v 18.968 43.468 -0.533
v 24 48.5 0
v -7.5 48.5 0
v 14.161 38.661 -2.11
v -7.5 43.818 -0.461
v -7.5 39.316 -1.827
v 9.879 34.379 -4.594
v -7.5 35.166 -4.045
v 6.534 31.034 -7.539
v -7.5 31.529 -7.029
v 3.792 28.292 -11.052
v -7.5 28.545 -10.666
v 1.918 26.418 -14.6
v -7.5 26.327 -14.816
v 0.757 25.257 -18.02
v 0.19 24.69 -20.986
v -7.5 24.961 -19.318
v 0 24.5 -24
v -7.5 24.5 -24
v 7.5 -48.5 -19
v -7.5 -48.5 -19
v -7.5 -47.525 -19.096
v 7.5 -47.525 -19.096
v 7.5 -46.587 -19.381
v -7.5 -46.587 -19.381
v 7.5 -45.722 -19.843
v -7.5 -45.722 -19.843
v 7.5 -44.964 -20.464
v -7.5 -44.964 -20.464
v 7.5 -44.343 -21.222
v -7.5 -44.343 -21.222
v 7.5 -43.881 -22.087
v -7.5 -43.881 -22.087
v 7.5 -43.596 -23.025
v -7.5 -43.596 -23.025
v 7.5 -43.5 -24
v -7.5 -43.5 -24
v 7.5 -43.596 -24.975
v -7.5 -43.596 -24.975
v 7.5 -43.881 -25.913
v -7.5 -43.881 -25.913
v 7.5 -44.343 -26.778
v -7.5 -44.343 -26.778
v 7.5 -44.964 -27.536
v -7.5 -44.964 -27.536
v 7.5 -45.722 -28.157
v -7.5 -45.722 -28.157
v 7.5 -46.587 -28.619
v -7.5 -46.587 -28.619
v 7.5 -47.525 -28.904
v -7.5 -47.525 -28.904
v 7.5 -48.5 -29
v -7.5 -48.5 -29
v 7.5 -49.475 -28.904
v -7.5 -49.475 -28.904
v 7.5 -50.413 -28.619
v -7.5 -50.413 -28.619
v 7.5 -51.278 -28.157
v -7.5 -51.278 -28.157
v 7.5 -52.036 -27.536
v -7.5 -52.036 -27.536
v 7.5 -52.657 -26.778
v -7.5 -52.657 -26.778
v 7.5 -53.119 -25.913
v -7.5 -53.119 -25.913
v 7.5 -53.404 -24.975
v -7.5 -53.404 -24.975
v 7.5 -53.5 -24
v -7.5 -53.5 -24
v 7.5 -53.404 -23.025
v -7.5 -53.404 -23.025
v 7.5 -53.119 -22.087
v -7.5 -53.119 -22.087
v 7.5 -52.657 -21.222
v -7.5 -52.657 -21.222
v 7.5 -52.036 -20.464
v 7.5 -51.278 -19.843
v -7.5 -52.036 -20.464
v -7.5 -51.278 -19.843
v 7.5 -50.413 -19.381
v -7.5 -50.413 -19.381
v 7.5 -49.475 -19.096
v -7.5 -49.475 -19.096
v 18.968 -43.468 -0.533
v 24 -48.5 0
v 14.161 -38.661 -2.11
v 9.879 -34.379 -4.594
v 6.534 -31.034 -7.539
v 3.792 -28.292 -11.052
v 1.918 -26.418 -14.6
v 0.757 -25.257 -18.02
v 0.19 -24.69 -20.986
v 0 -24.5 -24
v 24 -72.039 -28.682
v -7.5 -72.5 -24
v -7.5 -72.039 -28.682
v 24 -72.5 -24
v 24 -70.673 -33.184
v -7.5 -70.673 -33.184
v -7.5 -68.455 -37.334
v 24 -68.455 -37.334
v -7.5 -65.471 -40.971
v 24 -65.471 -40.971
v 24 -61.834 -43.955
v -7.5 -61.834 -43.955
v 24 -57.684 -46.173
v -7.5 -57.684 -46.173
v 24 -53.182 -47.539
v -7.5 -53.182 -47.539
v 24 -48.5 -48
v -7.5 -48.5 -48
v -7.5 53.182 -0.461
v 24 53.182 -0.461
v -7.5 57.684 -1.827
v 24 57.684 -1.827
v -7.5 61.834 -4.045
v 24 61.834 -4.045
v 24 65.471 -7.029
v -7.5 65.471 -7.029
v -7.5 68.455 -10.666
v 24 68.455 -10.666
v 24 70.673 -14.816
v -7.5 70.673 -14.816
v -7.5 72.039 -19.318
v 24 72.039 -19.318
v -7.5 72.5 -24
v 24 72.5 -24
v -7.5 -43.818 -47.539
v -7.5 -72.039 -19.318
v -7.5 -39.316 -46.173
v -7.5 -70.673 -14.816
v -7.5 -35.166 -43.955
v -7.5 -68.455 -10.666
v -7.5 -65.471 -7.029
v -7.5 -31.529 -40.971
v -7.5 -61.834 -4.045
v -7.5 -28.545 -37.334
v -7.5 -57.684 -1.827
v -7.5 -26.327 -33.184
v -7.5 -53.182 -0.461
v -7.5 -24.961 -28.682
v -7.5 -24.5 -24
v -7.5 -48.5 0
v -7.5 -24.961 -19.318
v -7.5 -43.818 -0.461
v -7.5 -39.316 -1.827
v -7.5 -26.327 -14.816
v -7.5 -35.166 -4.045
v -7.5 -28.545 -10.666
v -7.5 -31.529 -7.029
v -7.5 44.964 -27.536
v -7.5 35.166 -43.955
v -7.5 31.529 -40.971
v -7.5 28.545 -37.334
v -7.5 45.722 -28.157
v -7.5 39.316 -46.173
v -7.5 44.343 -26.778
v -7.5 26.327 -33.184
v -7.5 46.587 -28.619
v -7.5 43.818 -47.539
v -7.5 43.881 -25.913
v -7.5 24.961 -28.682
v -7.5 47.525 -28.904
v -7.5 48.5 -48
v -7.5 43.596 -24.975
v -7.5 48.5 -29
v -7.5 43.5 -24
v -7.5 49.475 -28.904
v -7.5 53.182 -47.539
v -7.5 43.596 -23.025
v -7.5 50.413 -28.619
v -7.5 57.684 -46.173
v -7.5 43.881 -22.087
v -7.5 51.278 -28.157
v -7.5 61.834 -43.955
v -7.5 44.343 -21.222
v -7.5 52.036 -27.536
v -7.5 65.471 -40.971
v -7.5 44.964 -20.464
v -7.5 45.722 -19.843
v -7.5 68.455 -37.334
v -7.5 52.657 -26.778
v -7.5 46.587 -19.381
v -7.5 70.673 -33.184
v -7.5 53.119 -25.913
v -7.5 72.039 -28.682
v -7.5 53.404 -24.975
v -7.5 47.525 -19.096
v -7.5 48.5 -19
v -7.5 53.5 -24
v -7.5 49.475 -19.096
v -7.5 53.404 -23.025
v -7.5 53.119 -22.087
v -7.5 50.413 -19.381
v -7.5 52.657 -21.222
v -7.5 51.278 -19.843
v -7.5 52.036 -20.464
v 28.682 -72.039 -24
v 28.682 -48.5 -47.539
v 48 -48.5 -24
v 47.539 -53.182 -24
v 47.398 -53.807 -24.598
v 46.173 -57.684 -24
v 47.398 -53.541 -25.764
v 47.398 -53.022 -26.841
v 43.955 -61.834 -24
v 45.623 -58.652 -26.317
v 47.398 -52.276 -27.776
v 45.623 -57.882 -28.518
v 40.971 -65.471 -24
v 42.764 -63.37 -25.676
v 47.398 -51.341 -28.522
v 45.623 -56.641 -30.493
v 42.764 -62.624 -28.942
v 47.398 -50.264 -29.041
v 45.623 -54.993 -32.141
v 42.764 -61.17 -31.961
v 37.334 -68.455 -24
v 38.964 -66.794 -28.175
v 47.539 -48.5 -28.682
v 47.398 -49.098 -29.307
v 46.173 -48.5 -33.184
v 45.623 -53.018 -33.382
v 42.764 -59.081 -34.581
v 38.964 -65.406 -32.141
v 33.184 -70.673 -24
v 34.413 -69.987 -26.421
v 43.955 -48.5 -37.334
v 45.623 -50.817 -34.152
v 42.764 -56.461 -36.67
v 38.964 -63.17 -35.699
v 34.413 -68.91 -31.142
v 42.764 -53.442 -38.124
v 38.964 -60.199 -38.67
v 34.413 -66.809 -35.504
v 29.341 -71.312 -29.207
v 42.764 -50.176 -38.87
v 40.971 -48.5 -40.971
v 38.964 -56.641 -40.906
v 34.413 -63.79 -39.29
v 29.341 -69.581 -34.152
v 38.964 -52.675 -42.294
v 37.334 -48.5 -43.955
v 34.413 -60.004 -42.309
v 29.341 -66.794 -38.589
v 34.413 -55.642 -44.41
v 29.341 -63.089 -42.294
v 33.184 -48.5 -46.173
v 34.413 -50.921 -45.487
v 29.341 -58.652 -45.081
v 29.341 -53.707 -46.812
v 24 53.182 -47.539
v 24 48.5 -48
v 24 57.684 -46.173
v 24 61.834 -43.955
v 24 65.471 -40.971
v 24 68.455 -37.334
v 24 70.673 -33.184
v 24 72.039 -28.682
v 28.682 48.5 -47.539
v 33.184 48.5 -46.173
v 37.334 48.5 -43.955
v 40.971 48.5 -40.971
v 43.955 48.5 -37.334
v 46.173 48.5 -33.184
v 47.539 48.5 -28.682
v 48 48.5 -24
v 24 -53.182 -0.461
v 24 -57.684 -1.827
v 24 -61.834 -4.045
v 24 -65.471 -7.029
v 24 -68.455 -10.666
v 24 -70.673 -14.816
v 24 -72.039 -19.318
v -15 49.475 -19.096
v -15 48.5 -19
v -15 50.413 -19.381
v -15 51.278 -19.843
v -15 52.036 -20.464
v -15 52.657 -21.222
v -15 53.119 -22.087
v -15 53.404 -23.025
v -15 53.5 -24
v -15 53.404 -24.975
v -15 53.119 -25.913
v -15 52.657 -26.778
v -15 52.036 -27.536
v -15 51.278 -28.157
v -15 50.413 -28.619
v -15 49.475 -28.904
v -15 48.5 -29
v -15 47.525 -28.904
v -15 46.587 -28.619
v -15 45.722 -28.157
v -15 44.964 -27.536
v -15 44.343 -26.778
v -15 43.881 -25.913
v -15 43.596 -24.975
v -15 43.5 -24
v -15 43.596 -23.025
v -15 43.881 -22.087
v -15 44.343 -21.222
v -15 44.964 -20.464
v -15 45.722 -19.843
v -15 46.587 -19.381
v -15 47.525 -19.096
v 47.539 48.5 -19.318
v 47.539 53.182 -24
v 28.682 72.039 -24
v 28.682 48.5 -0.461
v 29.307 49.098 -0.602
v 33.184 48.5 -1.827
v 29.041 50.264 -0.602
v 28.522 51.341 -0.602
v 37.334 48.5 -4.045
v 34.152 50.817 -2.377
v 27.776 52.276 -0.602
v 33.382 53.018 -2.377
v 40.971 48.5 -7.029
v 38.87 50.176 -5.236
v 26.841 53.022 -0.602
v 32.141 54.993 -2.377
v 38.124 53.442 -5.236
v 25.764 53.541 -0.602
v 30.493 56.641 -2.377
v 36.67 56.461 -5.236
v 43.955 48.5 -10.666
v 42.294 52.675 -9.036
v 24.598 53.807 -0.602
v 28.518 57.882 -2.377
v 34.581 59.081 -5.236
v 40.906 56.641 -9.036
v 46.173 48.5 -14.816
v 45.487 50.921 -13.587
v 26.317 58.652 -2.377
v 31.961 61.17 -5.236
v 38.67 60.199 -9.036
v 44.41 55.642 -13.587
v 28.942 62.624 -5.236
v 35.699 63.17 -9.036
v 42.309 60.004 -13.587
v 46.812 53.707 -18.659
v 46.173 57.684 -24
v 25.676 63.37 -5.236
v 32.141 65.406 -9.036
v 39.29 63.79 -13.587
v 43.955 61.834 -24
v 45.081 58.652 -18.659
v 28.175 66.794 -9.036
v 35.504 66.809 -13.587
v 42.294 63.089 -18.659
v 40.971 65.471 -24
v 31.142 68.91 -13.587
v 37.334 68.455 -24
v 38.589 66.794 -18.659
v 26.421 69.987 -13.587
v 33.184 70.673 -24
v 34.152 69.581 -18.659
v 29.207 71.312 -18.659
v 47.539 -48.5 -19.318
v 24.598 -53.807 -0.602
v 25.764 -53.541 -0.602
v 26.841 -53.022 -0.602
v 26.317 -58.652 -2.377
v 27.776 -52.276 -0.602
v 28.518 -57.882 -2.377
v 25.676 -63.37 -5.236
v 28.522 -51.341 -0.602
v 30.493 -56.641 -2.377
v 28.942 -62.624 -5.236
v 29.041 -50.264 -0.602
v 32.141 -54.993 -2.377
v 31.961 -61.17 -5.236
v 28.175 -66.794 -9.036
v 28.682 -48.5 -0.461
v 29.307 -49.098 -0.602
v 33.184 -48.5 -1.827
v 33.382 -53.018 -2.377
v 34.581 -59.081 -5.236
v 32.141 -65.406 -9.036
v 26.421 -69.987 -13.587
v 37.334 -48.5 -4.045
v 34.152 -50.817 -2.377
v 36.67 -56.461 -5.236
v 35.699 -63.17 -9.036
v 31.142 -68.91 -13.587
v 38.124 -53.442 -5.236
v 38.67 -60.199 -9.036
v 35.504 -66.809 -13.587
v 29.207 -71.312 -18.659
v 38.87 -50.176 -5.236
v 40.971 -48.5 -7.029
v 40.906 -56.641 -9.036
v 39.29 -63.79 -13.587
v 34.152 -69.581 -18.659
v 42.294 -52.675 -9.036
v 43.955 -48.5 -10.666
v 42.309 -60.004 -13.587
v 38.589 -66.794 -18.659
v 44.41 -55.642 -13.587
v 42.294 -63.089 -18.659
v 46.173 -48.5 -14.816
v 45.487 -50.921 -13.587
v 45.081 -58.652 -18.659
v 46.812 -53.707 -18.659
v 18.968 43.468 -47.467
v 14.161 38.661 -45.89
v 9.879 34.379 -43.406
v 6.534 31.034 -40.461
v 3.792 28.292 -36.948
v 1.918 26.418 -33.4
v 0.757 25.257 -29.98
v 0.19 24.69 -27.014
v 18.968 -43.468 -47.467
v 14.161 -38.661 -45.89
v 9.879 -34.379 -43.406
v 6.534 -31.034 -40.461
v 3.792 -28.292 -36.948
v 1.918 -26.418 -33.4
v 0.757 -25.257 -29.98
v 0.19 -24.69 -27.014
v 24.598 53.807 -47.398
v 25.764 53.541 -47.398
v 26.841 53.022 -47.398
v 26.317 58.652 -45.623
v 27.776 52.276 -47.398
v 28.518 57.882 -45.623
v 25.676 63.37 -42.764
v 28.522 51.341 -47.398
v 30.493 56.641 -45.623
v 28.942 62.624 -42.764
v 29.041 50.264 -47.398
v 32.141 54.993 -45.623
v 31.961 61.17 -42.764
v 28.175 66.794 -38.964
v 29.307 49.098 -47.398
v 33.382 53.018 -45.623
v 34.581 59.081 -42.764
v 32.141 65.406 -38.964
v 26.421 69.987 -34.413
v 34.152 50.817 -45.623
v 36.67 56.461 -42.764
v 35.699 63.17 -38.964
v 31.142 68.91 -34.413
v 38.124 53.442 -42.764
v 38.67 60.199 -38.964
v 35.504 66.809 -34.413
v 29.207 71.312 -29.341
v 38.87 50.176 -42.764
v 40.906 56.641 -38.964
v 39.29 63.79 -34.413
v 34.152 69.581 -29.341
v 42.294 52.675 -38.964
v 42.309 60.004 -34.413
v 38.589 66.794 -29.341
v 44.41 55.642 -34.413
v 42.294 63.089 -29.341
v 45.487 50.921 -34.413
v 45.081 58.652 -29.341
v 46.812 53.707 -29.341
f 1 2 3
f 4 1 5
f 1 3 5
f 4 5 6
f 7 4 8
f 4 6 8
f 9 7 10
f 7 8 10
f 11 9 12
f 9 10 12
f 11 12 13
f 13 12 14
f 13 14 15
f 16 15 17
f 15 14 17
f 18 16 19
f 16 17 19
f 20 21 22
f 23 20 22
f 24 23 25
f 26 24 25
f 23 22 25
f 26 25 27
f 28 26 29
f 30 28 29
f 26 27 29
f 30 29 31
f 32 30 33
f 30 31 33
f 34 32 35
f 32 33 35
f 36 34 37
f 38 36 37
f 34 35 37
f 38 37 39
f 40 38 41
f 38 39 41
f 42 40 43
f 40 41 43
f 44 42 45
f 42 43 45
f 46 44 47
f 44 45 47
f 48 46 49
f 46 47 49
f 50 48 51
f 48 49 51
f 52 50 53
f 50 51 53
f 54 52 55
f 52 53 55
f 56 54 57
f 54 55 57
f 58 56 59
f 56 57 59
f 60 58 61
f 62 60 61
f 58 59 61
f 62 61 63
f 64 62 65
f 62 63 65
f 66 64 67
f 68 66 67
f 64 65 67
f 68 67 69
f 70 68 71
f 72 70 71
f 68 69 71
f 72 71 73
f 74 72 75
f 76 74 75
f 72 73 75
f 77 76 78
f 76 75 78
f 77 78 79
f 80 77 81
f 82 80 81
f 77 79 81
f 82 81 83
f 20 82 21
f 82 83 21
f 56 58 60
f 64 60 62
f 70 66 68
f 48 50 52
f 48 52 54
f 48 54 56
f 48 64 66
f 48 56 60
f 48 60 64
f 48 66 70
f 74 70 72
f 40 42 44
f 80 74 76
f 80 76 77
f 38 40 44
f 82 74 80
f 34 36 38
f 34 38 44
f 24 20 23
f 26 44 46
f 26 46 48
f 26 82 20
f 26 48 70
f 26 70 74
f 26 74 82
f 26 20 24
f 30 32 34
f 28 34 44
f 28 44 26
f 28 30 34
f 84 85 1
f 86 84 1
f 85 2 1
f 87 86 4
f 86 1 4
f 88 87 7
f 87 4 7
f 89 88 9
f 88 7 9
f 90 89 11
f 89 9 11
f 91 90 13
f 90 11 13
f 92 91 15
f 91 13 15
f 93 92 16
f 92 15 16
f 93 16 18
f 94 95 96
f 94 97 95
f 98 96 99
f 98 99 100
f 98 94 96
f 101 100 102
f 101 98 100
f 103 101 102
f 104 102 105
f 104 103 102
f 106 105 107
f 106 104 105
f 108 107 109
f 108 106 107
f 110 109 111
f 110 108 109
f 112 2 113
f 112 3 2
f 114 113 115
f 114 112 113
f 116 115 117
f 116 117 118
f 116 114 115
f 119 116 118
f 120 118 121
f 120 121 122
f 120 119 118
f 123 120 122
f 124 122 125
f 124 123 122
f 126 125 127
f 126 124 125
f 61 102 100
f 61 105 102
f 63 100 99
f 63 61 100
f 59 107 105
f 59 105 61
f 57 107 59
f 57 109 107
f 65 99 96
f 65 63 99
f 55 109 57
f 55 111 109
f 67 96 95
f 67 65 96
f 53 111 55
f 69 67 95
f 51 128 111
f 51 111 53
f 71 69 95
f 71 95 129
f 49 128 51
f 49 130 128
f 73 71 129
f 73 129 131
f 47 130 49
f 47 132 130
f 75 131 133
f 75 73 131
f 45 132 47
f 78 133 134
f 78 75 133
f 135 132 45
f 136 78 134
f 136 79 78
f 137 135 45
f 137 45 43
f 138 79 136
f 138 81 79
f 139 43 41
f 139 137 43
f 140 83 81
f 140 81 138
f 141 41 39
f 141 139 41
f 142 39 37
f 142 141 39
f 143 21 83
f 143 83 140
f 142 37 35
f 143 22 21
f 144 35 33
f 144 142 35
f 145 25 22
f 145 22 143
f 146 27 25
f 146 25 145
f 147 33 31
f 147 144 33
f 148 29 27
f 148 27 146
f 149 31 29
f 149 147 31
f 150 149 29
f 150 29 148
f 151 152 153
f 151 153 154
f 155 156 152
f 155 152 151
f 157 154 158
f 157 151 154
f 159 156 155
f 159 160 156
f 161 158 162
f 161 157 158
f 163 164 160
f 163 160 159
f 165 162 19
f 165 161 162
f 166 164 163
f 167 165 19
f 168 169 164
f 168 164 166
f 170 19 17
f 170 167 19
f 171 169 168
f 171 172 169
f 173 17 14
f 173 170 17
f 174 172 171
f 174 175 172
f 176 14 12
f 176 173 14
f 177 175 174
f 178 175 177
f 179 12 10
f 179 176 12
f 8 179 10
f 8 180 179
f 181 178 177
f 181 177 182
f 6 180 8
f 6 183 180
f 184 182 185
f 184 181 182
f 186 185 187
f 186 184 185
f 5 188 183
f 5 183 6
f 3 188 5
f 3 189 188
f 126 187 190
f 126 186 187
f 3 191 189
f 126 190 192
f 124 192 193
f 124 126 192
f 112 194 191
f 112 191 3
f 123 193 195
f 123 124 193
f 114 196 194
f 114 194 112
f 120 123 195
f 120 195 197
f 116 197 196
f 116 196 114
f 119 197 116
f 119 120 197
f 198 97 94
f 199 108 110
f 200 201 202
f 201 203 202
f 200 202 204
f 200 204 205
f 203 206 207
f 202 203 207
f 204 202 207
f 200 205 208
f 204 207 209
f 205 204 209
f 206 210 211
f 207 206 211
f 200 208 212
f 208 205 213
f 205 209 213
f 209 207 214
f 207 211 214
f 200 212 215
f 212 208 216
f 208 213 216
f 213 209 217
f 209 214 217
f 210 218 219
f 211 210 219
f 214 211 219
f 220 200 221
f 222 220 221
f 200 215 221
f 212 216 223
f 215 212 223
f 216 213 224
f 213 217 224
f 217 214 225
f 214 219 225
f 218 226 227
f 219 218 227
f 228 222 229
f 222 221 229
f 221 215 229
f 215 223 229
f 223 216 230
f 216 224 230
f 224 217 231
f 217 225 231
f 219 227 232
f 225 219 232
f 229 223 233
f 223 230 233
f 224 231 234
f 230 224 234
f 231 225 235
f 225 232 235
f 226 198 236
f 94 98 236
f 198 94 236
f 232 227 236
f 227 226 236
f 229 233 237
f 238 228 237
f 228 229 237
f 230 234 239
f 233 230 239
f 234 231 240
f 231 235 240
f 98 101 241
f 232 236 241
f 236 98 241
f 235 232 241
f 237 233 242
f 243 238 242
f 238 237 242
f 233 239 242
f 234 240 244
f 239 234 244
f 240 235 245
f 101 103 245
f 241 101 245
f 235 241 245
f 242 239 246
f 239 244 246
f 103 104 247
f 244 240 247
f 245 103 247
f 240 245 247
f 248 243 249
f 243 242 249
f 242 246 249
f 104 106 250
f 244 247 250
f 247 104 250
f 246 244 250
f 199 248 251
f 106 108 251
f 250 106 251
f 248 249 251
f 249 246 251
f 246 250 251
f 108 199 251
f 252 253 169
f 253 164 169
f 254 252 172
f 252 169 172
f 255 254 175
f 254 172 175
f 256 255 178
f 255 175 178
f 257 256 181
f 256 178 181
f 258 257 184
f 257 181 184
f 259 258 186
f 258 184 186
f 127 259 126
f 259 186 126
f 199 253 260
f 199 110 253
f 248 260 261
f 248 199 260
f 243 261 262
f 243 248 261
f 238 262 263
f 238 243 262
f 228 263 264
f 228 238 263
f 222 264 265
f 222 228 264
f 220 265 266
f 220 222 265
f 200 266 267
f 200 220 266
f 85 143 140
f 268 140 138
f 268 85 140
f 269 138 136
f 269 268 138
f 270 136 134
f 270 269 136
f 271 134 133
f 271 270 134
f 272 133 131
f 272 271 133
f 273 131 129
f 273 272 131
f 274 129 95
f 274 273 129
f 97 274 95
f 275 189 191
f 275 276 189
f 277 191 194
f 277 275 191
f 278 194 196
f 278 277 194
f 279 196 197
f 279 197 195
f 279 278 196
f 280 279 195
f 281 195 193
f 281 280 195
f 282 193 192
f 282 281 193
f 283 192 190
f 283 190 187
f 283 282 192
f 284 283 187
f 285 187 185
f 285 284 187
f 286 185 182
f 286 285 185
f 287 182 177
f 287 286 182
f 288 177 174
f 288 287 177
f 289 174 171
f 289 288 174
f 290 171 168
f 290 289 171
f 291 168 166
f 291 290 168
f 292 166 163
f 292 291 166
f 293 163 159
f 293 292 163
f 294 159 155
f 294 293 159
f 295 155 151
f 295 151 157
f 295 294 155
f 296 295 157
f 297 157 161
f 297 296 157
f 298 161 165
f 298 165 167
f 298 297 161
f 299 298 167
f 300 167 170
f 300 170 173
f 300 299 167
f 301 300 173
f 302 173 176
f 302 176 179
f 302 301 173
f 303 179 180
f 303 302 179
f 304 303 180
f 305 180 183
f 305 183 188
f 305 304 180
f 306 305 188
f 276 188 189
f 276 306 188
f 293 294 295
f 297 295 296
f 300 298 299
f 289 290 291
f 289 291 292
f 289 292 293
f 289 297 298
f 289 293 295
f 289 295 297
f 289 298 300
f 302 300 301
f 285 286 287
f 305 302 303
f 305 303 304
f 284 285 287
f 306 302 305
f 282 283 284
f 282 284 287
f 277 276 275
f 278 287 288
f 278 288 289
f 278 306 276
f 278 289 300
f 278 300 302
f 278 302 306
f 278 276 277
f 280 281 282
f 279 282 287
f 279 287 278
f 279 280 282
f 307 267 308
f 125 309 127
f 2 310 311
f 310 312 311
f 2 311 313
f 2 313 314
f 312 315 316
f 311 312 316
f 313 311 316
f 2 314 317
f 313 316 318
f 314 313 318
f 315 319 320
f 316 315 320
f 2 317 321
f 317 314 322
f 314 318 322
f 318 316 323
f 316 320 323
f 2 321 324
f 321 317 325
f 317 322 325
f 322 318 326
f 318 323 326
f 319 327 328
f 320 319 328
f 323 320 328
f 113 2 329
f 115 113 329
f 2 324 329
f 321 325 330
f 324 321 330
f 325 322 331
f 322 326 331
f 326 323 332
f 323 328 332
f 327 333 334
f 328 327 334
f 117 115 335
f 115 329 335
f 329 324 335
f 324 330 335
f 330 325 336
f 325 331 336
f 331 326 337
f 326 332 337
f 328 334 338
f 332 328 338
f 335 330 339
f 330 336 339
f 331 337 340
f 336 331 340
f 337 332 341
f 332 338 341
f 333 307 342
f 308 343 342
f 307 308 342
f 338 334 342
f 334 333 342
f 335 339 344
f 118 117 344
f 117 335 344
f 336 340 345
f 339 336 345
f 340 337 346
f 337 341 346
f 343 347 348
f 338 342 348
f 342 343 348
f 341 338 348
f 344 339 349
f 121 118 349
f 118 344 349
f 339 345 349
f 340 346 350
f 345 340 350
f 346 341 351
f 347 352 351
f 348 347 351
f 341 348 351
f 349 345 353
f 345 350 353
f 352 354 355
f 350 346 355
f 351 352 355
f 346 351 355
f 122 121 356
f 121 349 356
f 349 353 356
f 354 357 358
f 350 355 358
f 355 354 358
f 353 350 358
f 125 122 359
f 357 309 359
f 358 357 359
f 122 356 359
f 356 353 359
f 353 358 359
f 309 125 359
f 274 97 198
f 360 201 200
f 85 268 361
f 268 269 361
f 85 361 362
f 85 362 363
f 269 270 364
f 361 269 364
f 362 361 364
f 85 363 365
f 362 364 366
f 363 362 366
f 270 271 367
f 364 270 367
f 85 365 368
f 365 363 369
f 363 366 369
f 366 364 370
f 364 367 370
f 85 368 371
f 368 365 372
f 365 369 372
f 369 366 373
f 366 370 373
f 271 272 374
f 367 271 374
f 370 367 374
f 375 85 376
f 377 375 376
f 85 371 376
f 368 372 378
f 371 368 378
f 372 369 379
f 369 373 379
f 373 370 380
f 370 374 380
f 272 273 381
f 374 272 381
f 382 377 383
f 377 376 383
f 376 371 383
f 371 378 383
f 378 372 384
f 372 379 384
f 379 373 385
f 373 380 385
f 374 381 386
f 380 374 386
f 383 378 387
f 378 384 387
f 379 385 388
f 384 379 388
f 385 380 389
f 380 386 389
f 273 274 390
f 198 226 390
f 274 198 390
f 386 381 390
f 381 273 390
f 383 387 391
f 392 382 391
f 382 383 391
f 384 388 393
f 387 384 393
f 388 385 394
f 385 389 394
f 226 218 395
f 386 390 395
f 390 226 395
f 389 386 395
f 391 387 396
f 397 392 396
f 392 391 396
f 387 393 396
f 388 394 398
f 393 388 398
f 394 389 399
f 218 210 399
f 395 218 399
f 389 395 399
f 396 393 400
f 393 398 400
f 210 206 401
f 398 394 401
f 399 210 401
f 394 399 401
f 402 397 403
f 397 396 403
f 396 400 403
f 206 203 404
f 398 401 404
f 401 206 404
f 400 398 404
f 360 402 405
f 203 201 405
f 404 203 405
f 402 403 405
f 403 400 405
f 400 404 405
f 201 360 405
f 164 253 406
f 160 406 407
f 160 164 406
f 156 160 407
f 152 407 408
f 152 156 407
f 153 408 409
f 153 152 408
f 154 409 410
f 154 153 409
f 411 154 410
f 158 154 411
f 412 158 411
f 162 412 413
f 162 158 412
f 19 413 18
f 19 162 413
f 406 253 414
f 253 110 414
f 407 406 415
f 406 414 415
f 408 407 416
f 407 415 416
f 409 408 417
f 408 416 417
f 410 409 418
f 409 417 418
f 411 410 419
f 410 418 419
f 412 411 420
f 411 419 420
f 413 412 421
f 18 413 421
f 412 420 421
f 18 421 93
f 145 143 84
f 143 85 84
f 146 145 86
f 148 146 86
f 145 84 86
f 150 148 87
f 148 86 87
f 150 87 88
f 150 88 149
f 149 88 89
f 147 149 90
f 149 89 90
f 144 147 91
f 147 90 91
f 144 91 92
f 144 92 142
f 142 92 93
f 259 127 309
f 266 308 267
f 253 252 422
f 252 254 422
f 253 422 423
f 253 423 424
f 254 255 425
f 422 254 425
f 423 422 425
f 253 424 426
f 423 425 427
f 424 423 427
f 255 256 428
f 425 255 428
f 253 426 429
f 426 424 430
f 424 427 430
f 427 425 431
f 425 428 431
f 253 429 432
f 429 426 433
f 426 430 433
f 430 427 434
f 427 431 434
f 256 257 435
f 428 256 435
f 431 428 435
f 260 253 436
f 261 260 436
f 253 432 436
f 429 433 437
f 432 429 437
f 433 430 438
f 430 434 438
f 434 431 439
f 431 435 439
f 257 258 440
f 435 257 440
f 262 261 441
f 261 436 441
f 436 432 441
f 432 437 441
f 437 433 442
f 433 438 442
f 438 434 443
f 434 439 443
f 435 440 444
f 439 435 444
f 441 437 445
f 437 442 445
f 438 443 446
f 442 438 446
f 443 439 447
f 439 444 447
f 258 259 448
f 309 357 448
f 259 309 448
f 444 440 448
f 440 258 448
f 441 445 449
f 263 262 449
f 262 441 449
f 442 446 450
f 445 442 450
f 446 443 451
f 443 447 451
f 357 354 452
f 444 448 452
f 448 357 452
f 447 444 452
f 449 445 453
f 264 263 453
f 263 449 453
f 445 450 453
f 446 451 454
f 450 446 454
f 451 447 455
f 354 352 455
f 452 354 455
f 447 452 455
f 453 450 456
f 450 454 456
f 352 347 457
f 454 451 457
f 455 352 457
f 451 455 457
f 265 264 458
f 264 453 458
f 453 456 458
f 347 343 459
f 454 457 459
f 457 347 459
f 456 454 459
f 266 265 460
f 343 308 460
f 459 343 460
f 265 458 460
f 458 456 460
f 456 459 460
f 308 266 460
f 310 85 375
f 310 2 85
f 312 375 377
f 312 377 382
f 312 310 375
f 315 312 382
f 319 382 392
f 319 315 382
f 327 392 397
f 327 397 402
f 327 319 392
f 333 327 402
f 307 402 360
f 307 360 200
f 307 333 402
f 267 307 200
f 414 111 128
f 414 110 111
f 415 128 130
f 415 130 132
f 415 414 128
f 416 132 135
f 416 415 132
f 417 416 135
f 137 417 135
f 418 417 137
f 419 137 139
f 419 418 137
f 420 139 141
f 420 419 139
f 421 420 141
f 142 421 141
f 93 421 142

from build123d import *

# Parameters (mm, degrees)
SKETCH1_W           = 48
SKETCH1_H           = 48
BOSS_EXTRUDE1_DEPTH = 72.5
SKETCH2_W           = 48
SKETCH2_H           = 48
BOSS_EXTRUDE2_DEPTH = 7.5
FILLET1_R           = 24
SKETCH3_R           = 5
CUT_EXTRUDE1_DEPTH  = 15
SKETCH4_R           = 5
BOSS_EXTRUDE3_DEPTH = 7.5


with BuildPart() as part:
    # Sketch1 → Boss-Extrude1 (new, symmetric)
    with BuildSketch(Plane(origin=(0, 0, 0), x_dir=(1, 0, 0), z_dir=(0, 1, 0))):
        with Locations((24, 24)):
            Rectangle(SKETCH1_W, SKETCH1_H)
    extrude(amount=BOSS_EXTRUDE1_DEPTH, both=True)

    # Sketch2 → Boss-Extrude2 (add, symmetric)
    with BuildSketch(Plane.ZY):
        with Locations((-24, 48.5)):
            Rectangle(SKETCH2_W, SKETCH2_H)
        with Locations((-24, -48.5)):
            Rectangle(SKETCH2_W, SKETCH2_H)
    extrude(amount=BOSS_EXTRUDE2_DEPTH, both=True)

    # Fillet1
    fillet1_edges = [part.edges().sort_by_distance(p)[0] for p in [
        (48, 72.5, -24),
        (0, 0, -48),
        (20.25, 72.5, -48),
        (0, 0, 0),
        (-3.75, 24.5, -48),
        (-3.75, 24.5, 0),
        (-3.75, -24.5, 0),
        (-3.75, -24.5, -48),
        (20.25, -72.5, -48),
        (48, -72.5, -24),
        (20.25, -72.5, 0),
        (48, 0, -48),
        (48, 0, 0),
        (20.25, 72.5, 0),
    ]]
    fillet(fillet1_edges, radius=FILLET1_R - 0.0001)  # a hair under: the kernel refuses the full size

    # Sketch3 → Cut-Extrude1 (cut)
    with BuildSketch(Plane.ZY.offset(7.5)):
        with Locations((-24, -48.5)):
            Circle(SKETCH3_R)
    extrude(amount=-CUT_EXTRUDE1_DEPTH, mode=Mode.SUBTRACT)

    # Sketch4 → Boss-Extrude3 (add, symmetric)
    with BuildSketch(Plane.ZY.offset(7.5)):
        with Locations((-24, 48.5)):
            Circle(SKETCH4_R)
    extrude(amount=BOSS_EXTRUDE3_DEPTH, both=True)


solid = part.part
